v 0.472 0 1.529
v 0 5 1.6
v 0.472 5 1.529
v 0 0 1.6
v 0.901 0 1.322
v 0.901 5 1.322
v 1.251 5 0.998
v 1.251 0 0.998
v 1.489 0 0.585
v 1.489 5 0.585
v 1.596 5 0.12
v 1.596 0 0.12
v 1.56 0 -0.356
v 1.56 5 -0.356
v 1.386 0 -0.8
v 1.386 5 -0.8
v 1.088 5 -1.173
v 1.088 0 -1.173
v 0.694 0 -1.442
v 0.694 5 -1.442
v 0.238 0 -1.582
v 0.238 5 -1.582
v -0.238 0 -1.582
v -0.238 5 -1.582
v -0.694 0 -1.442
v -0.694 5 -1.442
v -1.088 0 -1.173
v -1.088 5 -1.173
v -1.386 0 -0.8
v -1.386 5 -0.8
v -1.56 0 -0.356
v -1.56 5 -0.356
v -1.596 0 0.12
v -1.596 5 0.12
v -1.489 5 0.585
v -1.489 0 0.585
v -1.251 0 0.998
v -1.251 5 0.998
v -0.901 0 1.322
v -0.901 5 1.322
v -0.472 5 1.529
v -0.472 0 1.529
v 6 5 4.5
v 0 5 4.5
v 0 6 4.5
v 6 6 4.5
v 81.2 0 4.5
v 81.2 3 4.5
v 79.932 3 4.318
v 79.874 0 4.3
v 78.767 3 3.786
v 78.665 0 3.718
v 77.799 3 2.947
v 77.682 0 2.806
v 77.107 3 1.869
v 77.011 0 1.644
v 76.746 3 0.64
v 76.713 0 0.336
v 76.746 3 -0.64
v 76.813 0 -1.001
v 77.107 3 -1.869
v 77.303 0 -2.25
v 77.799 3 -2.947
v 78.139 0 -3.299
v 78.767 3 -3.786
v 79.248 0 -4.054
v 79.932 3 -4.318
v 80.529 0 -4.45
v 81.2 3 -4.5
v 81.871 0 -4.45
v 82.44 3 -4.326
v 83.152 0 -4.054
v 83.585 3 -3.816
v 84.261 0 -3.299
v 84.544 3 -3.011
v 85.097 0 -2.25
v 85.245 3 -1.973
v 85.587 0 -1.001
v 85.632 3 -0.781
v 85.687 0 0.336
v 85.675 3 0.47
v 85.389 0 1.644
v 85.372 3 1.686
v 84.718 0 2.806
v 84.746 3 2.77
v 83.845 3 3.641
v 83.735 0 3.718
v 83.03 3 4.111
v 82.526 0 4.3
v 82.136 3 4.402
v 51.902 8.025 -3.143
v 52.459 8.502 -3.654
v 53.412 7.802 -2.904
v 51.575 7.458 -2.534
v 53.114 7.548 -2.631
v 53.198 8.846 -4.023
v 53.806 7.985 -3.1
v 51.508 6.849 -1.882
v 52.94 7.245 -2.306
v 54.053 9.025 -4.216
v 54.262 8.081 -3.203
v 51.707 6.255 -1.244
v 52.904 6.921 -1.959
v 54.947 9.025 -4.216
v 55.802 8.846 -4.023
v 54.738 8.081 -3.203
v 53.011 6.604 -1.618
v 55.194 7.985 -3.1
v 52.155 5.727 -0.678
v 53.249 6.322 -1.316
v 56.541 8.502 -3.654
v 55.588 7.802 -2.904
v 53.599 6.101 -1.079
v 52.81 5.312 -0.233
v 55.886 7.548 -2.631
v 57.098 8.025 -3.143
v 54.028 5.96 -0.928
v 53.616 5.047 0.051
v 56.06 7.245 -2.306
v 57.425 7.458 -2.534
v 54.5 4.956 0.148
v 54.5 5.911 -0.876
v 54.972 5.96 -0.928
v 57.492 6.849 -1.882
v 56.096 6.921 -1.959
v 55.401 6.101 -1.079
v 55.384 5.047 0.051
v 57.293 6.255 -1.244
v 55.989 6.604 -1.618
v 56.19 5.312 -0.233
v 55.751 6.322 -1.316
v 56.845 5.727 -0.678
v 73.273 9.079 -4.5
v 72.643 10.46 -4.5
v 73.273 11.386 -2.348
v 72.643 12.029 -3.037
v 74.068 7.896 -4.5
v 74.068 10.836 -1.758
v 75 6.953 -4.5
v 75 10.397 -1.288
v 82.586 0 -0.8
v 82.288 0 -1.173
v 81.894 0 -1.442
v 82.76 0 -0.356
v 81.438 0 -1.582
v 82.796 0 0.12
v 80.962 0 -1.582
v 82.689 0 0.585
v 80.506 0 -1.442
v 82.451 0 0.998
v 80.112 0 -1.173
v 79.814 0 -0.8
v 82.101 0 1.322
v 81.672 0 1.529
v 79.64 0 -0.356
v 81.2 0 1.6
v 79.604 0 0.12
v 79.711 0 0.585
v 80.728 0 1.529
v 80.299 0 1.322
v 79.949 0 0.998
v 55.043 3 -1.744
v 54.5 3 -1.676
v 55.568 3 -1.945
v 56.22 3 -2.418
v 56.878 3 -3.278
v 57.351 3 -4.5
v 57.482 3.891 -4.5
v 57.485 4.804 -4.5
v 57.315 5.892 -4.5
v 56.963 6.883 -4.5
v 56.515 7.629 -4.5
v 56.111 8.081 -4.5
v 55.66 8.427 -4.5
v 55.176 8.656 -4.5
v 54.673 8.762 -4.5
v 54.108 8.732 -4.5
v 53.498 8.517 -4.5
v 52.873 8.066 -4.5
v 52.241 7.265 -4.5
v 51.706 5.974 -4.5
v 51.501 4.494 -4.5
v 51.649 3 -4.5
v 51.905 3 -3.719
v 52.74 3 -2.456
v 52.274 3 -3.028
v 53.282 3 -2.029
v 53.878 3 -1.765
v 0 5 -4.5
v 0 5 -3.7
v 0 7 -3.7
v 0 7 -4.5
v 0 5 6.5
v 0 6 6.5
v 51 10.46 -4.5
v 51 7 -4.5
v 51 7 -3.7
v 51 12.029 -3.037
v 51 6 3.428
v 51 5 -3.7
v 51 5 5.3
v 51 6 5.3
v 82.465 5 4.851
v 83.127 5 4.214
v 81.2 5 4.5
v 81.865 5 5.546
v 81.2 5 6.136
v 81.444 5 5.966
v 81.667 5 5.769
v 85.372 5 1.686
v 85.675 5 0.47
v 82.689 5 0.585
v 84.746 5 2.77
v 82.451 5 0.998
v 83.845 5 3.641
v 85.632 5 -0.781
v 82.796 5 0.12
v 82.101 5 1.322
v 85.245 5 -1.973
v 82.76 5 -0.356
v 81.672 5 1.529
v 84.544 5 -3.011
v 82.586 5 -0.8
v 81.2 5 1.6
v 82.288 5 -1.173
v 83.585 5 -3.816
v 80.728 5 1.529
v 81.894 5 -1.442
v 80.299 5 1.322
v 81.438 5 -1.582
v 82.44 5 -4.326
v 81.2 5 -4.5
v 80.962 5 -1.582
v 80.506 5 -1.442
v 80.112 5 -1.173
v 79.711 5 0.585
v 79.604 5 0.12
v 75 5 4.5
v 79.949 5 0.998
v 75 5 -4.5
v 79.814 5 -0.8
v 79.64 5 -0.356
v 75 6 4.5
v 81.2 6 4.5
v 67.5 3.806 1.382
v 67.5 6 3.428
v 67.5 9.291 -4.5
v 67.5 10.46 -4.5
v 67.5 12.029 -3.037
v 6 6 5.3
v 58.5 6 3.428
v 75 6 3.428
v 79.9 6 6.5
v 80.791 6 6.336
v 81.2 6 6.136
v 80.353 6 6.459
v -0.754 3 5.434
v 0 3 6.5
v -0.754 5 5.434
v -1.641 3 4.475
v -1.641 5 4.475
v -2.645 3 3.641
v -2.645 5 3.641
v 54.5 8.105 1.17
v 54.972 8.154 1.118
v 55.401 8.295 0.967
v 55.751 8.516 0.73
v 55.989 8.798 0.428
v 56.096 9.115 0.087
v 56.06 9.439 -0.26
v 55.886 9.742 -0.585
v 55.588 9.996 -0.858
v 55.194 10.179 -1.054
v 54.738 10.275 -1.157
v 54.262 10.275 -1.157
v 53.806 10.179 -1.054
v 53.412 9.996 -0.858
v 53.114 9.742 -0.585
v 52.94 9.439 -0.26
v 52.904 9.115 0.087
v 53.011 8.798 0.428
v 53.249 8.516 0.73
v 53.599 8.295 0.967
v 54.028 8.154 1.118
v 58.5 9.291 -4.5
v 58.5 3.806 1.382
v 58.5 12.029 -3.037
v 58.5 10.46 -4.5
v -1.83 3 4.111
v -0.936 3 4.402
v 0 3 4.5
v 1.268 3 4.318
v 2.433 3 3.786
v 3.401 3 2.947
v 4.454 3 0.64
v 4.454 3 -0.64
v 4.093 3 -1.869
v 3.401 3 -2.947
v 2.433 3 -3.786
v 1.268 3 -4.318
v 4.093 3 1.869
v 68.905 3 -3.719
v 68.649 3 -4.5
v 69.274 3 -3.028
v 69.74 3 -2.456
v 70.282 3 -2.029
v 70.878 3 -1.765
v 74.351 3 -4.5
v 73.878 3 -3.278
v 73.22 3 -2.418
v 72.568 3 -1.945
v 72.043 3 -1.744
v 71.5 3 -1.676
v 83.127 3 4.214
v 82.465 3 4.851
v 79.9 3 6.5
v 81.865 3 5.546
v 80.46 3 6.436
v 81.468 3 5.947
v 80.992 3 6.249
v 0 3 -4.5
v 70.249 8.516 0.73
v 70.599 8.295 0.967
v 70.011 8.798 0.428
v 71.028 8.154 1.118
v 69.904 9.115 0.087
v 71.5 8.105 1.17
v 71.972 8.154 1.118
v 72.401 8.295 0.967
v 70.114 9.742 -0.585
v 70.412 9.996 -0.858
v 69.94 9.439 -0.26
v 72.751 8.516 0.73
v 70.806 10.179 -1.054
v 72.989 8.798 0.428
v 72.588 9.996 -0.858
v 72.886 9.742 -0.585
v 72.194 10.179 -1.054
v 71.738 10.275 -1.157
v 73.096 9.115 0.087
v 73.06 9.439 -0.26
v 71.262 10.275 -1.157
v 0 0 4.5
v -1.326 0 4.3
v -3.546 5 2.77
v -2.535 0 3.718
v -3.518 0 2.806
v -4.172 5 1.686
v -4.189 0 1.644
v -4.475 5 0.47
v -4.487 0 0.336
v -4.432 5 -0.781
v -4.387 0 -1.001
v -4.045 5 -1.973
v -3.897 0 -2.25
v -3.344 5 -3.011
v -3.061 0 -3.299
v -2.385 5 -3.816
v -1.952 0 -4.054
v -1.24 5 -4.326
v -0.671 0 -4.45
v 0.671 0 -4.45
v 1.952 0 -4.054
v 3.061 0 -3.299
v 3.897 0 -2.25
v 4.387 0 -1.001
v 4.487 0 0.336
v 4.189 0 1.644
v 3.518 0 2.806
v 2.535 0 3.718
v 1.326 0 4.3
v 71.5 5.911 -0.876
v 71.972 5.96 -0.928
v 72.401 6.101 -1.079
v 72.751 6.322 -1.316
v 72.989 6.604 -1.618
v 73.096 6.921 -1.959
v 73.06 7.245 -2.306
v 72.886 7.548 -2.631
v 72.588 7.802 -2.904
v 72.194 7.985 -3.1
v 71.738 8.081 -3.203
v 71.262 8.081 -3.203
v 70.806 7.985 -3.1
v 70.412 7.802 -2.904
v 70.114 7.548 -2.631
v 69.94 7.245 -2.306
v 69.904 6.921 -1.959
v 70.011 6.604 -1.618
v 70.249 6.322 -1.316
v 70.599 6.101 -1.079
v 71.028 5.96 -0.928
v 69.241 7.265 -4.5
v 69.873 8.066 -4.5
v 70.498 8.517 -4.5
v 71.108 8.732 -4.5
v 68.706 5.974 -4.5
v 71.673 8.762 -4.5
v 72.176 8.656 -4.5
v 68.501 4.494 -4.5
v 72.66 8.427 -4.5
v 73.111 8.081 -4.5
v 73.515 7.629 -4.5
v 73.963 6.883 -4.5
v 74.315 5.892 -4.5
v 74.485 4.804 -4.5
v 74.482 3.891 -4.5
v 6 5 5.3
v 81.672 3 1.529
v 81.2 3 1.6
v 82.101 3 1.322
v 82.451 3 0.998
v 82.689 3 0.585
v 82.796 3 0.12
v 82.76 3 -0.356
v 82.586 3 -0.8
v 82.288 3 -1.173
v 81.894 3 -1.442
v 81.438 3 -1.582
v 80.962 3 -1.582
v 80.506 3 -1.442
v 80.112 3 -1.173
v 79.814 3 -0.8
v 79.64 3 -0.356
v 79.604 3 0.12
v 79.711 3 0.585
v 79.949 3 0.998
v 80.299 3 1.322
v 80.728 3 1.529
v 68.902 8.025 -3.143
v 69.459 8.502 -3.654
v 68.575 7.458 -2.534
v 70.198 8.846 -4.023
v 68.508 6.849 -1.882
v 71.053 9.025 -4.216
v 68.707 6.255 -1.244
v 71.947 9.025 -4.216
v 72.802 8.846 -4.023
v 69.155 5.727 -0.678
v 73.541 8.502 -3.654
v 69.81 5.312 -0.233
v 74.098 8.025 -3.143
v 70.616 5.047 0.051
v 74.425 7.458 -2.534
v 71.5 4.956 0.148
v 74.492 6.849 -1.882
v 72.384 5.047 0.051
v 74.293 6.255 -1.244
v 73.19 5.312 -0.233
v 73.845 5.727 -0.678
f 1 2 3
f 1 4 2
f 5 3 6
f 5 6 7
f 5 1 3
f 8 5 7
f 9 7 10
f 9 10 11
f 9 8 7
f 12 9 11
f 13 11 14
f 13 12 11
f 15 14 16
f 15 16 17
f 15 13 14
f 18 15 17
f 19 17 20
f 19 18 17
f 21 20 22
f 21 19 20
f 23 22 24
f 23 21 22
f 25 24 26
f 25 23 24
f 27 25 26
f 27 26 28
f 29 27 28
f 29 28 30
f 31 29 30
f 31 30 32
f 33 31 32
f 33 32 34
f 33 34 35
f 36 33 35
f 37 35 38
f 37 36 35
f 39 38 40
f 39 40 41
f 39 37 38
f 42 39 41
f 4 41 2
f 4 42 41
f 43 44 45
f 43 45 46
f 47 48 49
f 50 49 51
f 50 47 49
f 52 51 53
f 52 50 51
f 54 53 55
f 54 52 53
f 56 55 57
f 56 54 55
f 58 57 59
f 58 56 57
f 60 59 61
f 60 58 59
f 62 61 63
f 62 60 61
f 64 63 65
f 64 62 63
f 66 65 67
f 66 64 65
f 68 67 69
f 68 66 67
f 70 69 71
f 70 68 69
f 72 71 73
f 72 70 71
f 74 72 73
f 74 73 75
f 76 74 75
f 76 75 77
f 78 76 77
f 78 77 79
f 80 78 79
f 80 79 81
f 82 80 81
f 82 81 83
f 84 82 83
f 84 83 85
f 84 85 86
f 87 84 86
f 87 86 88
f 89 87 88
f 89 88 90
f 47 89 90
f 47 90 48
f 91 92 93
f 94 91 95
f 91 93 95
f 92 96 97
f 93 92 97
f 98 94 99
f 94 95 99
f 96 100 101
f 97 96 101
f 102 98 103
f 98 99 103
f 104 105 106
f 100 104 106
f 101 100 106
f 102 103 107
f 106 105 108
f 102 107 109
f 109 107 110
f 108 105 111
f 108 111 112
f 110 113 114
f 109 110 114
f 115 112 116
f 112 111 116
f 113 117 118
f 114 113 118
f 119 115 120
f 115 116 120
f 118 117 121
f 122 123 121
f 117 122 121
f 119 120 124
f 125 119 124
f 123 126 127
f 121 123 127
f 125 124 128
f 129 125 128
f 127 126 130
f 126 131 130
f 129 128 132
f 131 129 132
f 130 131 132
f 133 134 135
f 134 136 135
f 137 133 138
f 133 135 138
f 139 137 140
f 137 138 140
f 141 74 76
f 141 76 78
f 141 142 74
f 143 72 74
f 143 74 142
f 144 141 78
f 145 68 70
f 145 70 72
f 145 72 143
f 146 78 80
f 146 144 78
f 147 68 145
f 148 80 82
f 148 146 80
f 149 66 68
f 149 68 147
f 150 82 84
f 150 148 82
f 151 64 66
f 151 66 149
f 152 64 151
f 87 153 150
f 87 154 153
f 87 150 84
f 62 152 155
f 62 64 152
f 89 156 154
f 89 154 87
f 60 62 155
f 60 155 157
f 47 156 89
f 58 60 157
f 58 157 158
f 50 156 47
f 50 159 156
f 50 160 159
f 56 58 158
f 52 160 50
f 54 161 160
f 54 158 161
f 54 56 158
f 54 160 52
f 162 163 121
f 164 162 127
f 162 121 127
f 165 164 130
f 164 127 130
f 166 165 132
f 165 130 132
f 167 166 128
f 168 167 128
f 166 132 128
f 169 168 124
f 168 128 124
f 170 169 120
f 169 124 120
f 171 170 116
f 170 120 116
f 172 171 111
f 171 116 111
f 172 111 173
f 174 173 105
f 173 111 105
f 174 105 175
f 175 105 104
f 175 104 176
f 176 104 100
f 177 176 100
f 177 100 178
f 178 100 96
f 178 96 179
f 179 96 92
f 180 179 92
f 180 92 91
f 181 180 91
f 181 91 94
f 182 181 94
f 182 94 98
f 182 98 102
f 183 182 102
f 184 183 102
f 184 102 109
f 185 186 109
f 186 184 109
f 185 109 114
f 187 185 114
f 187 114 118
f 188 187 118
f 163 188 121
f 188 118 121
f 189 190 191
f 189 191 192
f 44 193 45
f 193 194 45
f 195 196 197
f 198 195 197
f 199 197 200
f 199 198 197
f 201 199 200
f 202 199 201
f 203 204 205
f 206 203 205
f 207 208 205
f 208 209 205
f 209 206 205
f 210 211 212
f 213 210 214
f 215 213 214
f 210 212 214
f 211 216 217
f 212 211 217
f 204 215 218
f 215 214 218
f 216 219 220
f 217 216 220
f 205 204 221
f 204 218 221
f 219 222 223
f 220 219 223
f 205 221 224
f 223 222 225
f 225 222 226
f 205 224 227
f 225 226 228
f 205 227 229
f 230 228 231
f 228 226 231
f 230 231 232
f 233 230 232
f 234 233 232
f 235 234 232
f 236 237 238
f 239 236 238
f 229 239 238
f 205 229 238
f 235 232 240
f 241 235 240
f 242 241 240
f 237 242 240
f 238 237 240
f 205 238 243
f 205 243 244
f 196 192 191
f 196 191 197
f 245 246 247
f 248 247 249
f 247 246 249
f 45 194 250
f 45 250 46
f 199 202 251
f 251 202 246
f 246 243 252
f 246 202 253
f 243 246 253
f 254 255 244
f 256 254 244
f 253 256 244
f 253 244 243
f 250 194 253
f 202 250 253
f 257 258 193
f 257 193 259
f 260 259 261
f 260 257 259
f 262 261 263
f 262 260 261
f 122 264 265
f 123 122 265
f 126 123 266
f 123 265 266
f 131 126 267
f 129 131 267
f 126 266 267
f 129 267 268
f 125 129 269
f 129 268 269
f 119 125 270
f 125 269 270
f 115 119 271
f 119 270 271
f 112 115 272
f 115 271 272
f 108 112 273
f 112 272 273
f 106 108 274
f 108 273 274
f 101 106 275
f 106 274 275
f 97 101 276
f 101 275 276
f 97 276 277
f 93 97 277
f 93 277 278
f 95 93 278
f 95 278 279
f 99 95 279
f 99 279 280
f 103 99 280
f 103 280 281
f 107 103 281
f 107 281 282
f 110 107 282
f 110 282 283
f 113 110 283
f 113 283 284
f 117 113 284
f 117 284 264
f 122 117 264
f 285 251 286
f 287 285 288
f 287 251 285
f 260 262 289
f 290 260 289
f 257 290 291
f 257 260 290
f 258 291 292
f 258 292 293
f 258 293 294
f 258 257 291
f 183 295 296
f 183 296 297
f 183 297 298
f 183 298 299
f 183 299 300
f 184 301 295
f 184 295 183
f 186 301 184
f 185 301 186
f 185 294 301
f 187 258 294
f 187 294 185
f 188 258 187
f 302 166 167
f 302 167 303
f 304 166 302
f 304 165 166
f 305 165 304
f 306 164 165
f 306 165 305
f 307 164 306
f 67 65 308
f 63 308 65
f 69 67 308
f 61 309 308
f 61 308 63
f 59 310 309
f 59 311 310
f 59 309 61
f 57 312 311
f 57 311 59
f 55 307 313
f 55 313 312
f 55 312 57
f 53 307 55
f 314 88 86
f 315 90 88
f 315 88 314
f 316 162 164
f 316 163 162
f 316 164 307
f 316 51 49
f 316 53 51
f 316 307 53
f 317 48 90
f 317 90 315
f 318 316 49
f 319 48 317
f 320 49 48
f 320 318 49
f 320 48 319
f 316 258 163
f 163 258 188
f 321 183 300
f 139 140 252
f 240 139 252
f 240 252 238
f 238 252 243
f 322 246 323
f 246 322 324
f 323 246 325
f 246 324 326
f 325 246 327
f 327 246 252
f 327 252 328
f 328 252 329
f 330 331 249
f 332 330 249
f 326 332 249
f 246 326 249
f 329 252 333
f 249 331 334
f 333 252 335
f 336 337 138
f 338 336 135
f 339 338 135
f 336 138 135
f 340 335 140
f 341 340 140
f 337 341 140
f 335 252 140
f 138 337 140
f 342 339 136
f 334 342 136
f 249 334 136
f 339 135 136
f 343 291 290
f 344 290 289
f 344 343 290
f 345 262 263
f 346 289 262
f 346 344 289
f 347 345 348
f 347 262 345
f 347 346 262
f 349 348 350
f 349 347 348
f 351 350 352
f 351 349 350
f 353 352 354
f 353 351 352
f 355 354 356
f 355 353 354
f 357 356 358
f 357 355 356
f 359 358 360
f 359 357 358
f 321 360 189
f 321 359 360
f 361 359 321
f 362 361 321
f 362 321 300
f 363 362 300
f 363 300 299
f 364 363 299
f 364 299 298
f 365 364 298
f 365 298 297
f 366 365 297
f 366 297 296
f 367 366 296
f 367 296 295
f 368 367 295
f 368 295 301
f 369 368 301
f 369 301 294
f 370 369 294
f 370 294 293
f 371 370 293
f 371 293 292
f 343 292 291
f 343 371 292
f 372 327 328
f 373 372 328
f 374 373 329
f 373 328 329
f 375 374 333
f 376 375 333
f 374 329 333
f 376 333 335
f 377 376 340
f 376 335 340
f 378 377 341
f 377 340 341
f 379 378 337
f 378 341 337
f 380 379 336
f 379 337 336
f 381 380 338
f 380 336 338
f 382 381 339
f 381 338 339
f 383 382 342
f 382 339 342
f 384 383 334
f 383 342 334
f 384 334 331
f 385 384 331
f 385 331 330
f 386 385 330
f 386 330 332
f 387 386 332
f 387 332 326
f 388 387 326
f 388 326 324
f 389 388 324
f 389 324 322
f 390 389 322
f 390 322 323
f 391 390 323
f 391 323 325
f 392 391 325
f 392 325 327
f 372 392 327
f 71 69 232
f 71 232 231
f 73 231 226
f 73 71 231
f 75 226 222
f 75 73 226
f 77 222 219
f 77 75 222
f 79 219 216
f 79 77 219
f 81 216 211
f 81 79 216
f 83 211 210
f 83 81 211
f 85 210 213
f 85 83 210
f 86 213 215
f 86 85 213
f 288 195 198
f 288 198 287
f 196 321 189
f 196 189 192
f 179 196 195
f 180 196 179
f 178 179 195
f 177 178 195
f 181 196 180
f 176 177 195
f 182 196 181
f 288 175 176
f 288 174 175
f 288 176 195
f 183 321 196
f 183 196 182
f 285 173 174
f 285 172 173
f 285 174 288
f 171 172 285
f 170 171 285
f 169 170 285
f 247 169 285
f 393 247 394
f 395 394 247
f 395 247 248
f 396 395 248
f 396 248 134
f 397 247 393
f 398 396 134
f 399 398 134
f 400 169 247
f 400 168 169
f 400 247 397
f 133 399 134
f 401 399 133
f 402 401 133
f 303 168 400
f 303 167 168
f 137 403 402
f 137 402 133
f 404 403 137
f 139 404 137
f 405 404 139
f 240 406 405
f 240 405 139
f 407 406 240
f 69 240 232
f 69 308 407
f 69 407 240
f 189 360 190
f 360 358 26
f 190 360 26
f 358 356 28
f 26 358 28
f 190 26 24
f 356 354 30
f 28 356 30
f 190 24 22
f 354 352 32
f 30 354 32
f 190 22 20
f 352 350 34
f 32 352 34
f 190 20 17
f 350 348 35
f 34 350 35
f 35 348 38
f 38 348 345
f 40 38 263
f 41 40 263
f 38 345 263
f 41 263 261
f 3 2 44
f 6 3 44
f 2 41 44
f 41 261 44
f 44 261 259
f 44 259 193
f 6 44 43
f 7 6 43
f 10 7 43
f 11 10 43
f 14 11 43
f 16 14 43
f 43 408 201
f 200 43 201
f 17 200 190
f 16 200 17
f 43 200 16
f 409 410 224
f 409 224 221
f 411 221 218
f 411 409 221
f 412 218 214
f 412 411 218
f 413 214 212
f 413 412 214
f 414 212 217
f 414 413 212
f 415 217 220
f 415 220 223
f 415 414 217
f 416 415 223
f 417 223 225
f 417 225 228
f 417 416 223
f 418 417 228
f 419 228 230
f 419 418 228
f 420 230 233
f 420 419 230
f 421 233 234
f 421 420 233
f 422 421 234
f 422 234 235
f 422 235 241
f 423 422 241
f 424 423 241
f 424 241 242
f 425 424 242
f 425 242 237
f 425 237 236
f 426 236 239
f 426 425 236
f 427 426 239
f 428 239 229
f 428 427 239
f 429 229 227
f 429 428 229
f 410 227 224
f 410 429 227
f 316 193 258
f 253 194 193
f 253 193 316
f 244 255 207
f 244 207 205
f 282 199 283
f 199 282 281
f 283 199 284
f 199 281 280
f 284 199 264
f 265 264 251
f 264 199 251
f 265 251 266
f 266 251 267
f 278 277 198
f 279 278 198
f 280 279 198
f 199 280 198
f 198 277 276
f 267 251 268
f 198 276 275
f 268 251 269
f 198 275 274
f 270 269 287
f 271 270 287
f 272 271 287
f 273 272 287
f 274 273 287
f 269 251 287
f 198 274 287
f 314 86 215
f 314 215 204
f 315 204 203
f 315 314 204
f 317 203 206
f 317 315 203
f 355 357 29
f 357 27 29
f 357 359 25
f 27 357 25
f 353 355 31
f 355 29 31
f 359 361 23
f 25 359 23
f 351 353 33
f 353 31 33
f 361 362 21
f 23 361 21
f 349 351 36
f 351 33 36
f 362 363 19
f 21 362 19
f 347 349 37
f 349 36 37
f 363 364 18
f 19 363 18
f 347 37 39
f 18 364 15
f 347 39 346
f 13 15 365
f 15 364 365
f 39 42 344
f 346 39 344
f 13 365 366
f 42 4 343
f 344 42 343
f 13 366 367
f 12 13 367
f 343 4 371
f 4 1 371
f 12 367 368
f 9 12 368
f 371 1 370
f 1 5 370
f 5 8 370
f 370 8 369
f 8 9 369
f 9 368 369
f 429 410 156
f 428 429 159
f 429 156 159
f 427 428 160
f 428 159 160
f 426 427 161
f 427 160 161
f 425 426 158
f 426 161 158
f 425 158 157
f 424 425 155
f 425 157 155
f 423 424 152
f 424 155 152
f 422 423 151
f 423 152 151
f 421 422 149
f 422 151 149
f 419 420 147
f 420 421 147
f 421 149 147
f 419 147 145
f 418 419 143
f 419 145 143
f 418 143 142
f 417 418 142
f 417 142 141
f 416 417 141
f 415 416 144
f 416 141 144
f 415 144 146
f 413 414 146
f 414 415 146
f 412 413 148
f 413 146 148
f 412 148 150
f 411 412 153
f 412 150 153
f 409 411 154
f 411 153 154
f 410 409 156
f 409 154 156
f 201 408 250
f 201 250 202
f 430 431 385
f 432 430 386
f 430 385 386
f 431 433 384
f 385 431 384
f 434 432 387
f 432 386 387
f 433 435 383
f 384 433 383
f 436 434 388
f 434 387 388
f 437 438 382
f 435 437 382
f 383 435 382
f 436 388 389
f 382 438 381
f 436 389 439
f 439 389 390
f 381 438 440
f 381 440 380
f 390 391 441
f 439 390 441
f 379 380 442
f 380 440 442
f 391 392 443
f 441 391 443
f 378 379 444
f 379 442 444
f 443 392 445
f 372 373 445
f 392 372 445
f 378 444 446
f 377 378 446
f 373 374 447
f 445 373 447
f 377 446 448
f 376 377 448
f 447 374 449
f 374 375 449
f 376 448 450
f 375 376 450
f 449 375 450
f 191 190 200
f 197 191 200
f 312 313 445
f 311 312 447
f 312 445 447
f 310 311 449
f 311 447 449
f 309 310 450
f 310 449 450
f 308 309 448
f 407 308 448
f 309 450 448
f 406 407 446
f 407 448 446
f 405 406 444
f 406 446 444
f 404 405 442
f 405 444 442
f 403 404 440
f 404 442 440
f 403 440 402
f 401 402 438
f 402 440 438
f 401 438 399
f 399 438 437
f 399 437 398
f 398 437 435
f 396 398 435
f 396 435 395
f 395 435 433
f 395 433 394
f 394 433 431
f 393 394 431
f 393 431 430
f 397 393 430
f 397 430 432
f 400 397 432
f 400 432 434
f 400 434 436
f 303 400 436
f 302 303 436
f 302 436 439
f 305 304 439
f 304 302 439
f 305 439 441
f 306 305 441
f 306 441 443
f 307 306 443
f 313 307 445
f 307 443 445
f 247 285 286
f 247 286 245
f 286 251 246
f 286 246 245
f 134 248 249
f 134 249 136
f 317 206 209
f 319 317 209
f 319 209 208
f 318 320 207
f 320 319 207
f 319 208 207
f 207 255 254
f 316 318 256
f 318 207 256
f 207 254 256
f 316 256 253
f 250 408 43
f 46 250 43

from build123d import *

# Parameters (mm, degrees)
SKETCH_1_R                  = 4.5
SKETCH_1_R_2                = 1.6
EXTRUDE_1_DEPTH             = 3
SKETCH_2_R                  = 1.6
EXTRUDE_2_DEPTH             = 2
EXTRUDE_3_DEPTH             = 24
CUT_EXTRUDE_1_REACH         = 88.596
SKETCH_4_R                  = 1.6
SKETCH_6_W                  = 9
SKETCH_6_H                  = 13.66994387
CUT_EXTRUDE_2_DEPTH         = 3
CUT_EXTRUDE_3_REACH         = 88.648
SKETCH_7_R                  = 3
EXTRUDE_START               = 3
SKETCH_8_R                  = 4.5
SKETCH_8_R_2                = 1.6
EXTRUDE_4_DEPTH             = 3
CUT_EXTRUDE_4_REACH         = 88.596
SKETCH_9_R                  = 6
SKETCH_10_W                 = 51
SKETCH_10_H                 = 0.8
EXTRUDE_5_DEPTH             = 2
SKETCH_11_W                 = 81.2
SKETCH_11_H                 = 2
EXTRUDE_6_DEPTH             = 1
EXTRUDE_6_DIRECTION_2_REACH = 88.227
FILLET_1_R                  = 10
CUT_EXTRUDE_5_REACH         = 88.355
SKETCH_12_W                 = 45
SKETCH_12_H                 = 0.8
EXTRUDE_7_DEPTH             = 24
EXTRUDE_8_DEPTH             = 9
CUT_EXTRUDE_START           = -2.144737
SKETCH_15_W                 = 21.643481228
SKETCH_15_H                 = 2
CUT_EXTRUDE_6_DEPTH         = 2.144737
CUT_EXTRUDE_7_REACH         = 88.157


with BuildPart() as part:
    # 草图1 → 凸台-拉伸1 (new body)
    with BuildSketch(Plane(origin=(0, 0, 0), x_dir=(1, 0, 0), z_dir=(0, 1, 0))):
        with Locations(Location((0, 0, 0), (0, 0, 270))):
            Circle(SKETCH_1_R)
        with Locations(Location((0, 0, 0), (0, 0, 270))):
            Circle(SKETCH_1_R_2, mode=Mode.SUBTRACT)
    extrude(amount=EXTRUDE_1_DEPTH)

    # 草图2 → 凸台-拉伸2 (add)
    with BuildSketch(Plane(origin=(0, 3, 0), x_dir=(1, 0, 0), z_dir=(0, 1, 0))):
        with BuildLine():
            Line((0, 4.5), (81.2, 4.5))
            ThreePointArc((81.2, 4.5), (85.7, 0), (81.2, -4.5))
            Line((81.2, -4.5), (0, -4.5))
            ThreePointArc((0, -4.5), (-4.5, 0), (0, 4.5))
        make_face()
        with Locations(Location((81.2, 0, 0), (0, 0, 270))):
            Circle(SKETCH_2_R, mode=Mode.SUBTRACT)
        with Locations(Location((0, 0, 0), (0, 0, 270))):
            Circle(SKETCH_2_R, mode=Mode.SUBTRACT)
    extrude(amount=EXTRUDE_2_DEPTH)

    # 草图3 → 凸台-拉伸3 (add)
    with BuildSketch(Plane(origin=(75, 0, 0), x_dir=(0, 0, -1), z_dir=(1, 0, 0))):
        Polygon((-4.5, 5), (4.5, 13.392635775), (4.5, 5), align=None)
    extrude(amount=-EXTRUDE_3_DEPTH)

    # 草图4 → 切除-拉伸1 (cut, up to next)
    with BuildSketch(Plane(origin=(0, 4.918910297, 4.58695806), x_dir=(1, 0, 0), z_dir=(0, 0.7313537016191739, 0.6819983600624948)), mode=Mode.PRIVATE) as cut_extrude_1_sk1:
        with Locations(Location((54.5, 6.271873718, 0), (0, 0, 270))):
            Circle(SKETCH_4_R)
    cut_extrude_1_tool1 = extrude(cut_extrude_1_sk1.sketch, amount=-CUT_EXTRUDE_1_REACH, mode=Mode.PRIVATE) & part.part
    # 草图4 → 切除-拉伸1 (cut, up to next)
    with BuildSketch(Plane(origin=(0, 4.918910297, 4.58695806), x_dir=(1, 0, 0), z_dir=(0, 0.7313537016191739, 0.6819983600624948)), mode=Mode.PRIVATE) as cut_extrude_1_sk2:
        with Locations(Location((71.5, 6.271873718, 0), (0, 0, 270))):
            Circle(SKETCH_4_R)
    cut_extrude_1_tool2 = extrude(cut_extrude_1_sk2.sketch, amount=-CUT_EXTRUDE_1_REACH, mode=Mode.PRIVATE) & part.part
    add(cut_extrude_1_tool1.solids().sort_by_distance((54.5, 9.196318, 0))[0], mode=Mode.SUBTRACT)
    add(cut_extrude_1_tool2.solids().sort_by_distance((71.5, 9.196318, 0))[0], mode=Mode.SUBTRACT)

    # 草图6 → 切除-拉伸2 (cut)
    with BuildSketch(Plane(origin=(0, 4.918910297, 4.58695806), x_dir=(1, 0, 0), z_dir=(0, 0.7313537016191739, 0.6819983600624948))):
        with Locations((63, 5.589875358)):
            Rectangle(SKETCH_6_W, SKETCH_6_H)
    extrude(amount=-CUT_EXTRUDE_2_DEPTH, mode=Mode.SUBTRACT)

    # 草图7 → 切除-拉伸3 (cut, up to next)
    with BuildSketch(Plane(origin=(0, 2.724849193, 2.54096298), x_dir=(1, 0, 0), z_dir=(0, 0.7313537016191739, 0.6819983600624948)), mode=Mode.PRIVATE) as cut_extrude_3_sk1:
        with Locations(Location((54.5, 6.271873718, 0), (0, 0, 270))):
            Circle(SKETCH_7_R)
    cut_extrude_3_tool1 = extrude(cut_extrude_3_sk1.sketch, amount=-CUT_EXTRUDE_3_REACH, mode=Mode.PRIVATE) & part.part
    # 草图7 → 切除-拉伸3 (cut, up to next)
    with BuildSketch(Plane(origin=(0, 2.724849193, 2.54096298), x_dir=(1, 0, 0), z_dir=(0, 0.7313537016191739, 0.6819983600624948)), mode=Mode.PRIVATE) as cut_extrude_3_sk2:
        with Locations(Location((71.5, 6.271873718, 0), (0, 0, 270))):
            Circle(SKETCH_7_R)
    cut_extrude_3_tool2 = extrude(cut_extrude_3_sk2.sketch, amount=-CUT_EXTRUDE_3_REACH, mode=Mode.PRIVATE) & part.part
    add(cut_extrude_3_tool1.solids().sort_by_distance((54.5, 7.002257, -2.045995))[0], mode=Mode.SUBTRACT)
    add(cut_extrude_3_tool2.solids().sort_by_distance((71.5, 7.002257, -2.045995))[0], mode=Mode.SUBTRACT)

    # 草图8 → 凸台-拉伸4 (add)
    with BuildSketch(Plane.XZ.offset(-3).offset(EXTRUDE_START)):
        with Locations(Location((81.2, 0, 0), (0, 0, 90))):
            Circle(SKETCH_8_R)
        with Locations(Location((81.2, 0, 0), (0, 0, 90))):
            Circle(SKETCH_8_R_2, mode=Mode.SUBTRACT)
    extrude(amount=-EXTRUDE_4_DEPTH)

    # 草图9 → 切除-拉伸4 (cut, up to next)
    with BuildSketch(Plane(origin=(0, 4.918910297, 4.58695806), x_dir=(1, 0, 0), z_dir=(0, 0.7313537016191739, 0.6819983600624948)), mode=Mode.PRIVATE) as cut_extrude_4_sk1:
        with Locations((77.925, 13.271873718)):
            Circle(SKETCH_9_R)
    cut_extrude_4_tool1 = extrude(cut_extrude_4_sk1.sketch, amount=-CUT_EXTRUDE_4_REACH, mode=Mode.PRIVATE) & part.part
    add(cut_extrude_4_tool1.solids().sort_by_distance((77.925, 13.970306, -5.119476))[0], mode=Mode.SUBTRACT)

    # 草图10 → 凸台-拉伸5 (add)
    with BuildSketch(Plane(origin=(0, 5, 0), x_dir=(1, 0, 0), z_dir=(0, 1, 0))):
        with Locations((25.5, 4.1)):
            Rectangle(SKETCH_10_W, SKETCH_10_H)
    extrude(amount=EXTRUDE_5_DEPTH)

    # 草图11 → 凸台-拉伸6 (add)
    with BuildSketch(Plane(origin=(0, 5, 0), x_dir=(1, 0, 0), z_dir=(0, 1, 0))):
        with Locations((40.6, -5.5)):
            Rectangle(SKETCH_11_W, SKETCH_11_H)
    extrude(amount=EXTRUDE_6_DEPTH)

    # 凸台-拉伸6 direction 2: up to this face of the body (flat: up to its plane)
    extrude_6_direction_2_end = Plane(part.part.faces().sort_by_distance((39.023781637, 3, 0.016114568))[0])
    # 草图11 → 凸台-拉伸6 direction 2 (add, up to the picked face)
    with BuildSketch(Plane(origin=(0, 5, 0), x_dir=(1, 0, 0), z_dir=(0, 1, 0)), mode=Mode.PRIVATE) as extrude_6_direction_2_sk1:
        with Locations((40.6, -5.5)):
            Rectangle(SKETCH_11_W, SKETCH_11_H)
    extrude_6_direction_2_tool1 = split(extrude(extrude_6_direction_2_sk1.sketch, amount=-EXTRUDE_6_DIRECTION_2_REACH, mode=Mode.PRIVATE), bisect_by=extrude_6_direction_2_end, keep=Keep.BOTH, mode=Mode.PRIVATE)
    add(extrude_6_direction_2_tool1.solids().sort_by(Axis((40.6, 5, 5.5), (0, -1, 0)))[0])

    # 圆角1
    # the kernel refuses this fillet: 10 mm, written as the material it adds along each edge
    with BuildSketch(Plane(origin=(81.2, 3, 4.5), x_dir=(0.9510569298520609, 0, -0.30901572157476376), z_dir=(0, 1, 0))) as fillet_1_piece_1:
        with BuildLine():
            CenterArc((5.87129871, -9.510569299), FILLET_1_R, 107.999923321, 22.461280704)
            Line((-0.618031443, -1.90211386), (0, 0))
            ThreePointArc((0, 0), (1.390570747, -0.220243816), (2.781141494, 0))
        make_face()
    extrude(amount=2)
    with BuildSketch(Plane(origin=(0, 3, 4.5), x_dir=(-0.9510569298520611, 0, -0.3090157215747629), z_dir=(0, 1, 0))) as fillet_1_piece_2:
        with BuildLine():
            CenterArc((5.87129871, 9.510569299), FILLET_1_R, 229.538795975, 22.461280704)
            Line((-0.618031443, 1.90211386), (0, 0))
            ThreePointArc((0, 0), (1.390570747, 0.220243816), (2.781141494, 0))
        make_face()
    extrude(amount=2)

    # 草图12 → 切除-拉伸5 (cut, up to next)
    with BuildSketch(Plane(origin=(0, 5, 0), x_dir=(1, 0, 0), z_dir=(0, 1, 0)), mode=Mode.PRIVATE) as cut_extrude_5_sk1:
        with Locations((28.5, -4.9)):
            Rectangle(SKETCH_12_W, SKETCH_12_H)
    cut_extrude_5_tool1 = extrude(cut_extrude_5_sk1.sketch, amount=CUT_EXTRUDE_5_REACH, mode=Mode.PRIVATE) & part.part
    add(cut_extrude_5_tool1.solids().sort_by_distance((28.5, 5, 4.9))[0], mode=Mode.SUBTRACT)

    # 草图13 → 凸台-拉伸7 (add)
    with BuildSketch(Plane(origin=(75, 0, 0), x_dir=(0, 0, -1), z_dir=(1, 0, 0))):
        Polygon((-4.5, 6), (-3.42763129, 6), (-4.5, 5), align=None)
    extrude(amount=-EXTRUDE_7_DEPTH)

    # 草图14 → 凸台-拉伸8 (add)
    with BuildSketch(Plane(origin=(58.5, 0, 0), x_dir=(0, 0, -1), z_dir=(1, 0, 0))):
        Polygon((-3.42763129, 6), (-1.38163621, 3.805938895), (-2.245899863, 3), (-4.5, 3), (-4.5, 5), align=None)
    extrude(amount=EXTRUDE_8_DEPTH)

    # 草图15 → 切除-拉伸6 (cut)
    with BuildSketch(Plane(origin=(0, 4.918910297, 4.58695806), x_dir=(1, 0, 0), z_dir=(0, 0.7313537016191739, 0.6819983600624948)).offset(CUT_EXTRUDE_START)):
        with Locations((61.821740614, 11.424847293)):
            Rectangle(SKETCH_15_W, SKETCH_15_H)
    extrude(amount=CUT_EXTRUDE_6_DEPTH, mode=Mode.SUBTRACT)

    # 草图16 → 切除-拉伸7 (cut, up to next)
    with BuildSketch(Plane(origin=(0, 6, 0), x_dir=(1, 0, 0), z_dir=(0, 1, 0)), mode=Mode.PRIVATE) as cut_extrude_7_sk1:
        with BuildLine():
            Line((79.900166375, -6.5), (81.2, -6.5))
            ThreePointArc((81.2, -6.5), (81.518478449, -6.013408883), (81.864704052, -5.546153846))
            ThreePointArc((81.864704052, -5.546153846), (80.992094803, -6.24893137), (79.900166375, -6.5))
        make_face()
    cut_extrude_7_tool1 = extrude(cut_extrude_7_sk1.sketch, amount=-CUT_EXTRUDE_7_REACH, mode=Mode.PRIVATE) & part.part
    add(cut_extrude_7_tool1.solids().sort_by_distance((81.054691, 6, 6.297183))[0], mode=Mode.SUBTRACT)


solid = part.part
